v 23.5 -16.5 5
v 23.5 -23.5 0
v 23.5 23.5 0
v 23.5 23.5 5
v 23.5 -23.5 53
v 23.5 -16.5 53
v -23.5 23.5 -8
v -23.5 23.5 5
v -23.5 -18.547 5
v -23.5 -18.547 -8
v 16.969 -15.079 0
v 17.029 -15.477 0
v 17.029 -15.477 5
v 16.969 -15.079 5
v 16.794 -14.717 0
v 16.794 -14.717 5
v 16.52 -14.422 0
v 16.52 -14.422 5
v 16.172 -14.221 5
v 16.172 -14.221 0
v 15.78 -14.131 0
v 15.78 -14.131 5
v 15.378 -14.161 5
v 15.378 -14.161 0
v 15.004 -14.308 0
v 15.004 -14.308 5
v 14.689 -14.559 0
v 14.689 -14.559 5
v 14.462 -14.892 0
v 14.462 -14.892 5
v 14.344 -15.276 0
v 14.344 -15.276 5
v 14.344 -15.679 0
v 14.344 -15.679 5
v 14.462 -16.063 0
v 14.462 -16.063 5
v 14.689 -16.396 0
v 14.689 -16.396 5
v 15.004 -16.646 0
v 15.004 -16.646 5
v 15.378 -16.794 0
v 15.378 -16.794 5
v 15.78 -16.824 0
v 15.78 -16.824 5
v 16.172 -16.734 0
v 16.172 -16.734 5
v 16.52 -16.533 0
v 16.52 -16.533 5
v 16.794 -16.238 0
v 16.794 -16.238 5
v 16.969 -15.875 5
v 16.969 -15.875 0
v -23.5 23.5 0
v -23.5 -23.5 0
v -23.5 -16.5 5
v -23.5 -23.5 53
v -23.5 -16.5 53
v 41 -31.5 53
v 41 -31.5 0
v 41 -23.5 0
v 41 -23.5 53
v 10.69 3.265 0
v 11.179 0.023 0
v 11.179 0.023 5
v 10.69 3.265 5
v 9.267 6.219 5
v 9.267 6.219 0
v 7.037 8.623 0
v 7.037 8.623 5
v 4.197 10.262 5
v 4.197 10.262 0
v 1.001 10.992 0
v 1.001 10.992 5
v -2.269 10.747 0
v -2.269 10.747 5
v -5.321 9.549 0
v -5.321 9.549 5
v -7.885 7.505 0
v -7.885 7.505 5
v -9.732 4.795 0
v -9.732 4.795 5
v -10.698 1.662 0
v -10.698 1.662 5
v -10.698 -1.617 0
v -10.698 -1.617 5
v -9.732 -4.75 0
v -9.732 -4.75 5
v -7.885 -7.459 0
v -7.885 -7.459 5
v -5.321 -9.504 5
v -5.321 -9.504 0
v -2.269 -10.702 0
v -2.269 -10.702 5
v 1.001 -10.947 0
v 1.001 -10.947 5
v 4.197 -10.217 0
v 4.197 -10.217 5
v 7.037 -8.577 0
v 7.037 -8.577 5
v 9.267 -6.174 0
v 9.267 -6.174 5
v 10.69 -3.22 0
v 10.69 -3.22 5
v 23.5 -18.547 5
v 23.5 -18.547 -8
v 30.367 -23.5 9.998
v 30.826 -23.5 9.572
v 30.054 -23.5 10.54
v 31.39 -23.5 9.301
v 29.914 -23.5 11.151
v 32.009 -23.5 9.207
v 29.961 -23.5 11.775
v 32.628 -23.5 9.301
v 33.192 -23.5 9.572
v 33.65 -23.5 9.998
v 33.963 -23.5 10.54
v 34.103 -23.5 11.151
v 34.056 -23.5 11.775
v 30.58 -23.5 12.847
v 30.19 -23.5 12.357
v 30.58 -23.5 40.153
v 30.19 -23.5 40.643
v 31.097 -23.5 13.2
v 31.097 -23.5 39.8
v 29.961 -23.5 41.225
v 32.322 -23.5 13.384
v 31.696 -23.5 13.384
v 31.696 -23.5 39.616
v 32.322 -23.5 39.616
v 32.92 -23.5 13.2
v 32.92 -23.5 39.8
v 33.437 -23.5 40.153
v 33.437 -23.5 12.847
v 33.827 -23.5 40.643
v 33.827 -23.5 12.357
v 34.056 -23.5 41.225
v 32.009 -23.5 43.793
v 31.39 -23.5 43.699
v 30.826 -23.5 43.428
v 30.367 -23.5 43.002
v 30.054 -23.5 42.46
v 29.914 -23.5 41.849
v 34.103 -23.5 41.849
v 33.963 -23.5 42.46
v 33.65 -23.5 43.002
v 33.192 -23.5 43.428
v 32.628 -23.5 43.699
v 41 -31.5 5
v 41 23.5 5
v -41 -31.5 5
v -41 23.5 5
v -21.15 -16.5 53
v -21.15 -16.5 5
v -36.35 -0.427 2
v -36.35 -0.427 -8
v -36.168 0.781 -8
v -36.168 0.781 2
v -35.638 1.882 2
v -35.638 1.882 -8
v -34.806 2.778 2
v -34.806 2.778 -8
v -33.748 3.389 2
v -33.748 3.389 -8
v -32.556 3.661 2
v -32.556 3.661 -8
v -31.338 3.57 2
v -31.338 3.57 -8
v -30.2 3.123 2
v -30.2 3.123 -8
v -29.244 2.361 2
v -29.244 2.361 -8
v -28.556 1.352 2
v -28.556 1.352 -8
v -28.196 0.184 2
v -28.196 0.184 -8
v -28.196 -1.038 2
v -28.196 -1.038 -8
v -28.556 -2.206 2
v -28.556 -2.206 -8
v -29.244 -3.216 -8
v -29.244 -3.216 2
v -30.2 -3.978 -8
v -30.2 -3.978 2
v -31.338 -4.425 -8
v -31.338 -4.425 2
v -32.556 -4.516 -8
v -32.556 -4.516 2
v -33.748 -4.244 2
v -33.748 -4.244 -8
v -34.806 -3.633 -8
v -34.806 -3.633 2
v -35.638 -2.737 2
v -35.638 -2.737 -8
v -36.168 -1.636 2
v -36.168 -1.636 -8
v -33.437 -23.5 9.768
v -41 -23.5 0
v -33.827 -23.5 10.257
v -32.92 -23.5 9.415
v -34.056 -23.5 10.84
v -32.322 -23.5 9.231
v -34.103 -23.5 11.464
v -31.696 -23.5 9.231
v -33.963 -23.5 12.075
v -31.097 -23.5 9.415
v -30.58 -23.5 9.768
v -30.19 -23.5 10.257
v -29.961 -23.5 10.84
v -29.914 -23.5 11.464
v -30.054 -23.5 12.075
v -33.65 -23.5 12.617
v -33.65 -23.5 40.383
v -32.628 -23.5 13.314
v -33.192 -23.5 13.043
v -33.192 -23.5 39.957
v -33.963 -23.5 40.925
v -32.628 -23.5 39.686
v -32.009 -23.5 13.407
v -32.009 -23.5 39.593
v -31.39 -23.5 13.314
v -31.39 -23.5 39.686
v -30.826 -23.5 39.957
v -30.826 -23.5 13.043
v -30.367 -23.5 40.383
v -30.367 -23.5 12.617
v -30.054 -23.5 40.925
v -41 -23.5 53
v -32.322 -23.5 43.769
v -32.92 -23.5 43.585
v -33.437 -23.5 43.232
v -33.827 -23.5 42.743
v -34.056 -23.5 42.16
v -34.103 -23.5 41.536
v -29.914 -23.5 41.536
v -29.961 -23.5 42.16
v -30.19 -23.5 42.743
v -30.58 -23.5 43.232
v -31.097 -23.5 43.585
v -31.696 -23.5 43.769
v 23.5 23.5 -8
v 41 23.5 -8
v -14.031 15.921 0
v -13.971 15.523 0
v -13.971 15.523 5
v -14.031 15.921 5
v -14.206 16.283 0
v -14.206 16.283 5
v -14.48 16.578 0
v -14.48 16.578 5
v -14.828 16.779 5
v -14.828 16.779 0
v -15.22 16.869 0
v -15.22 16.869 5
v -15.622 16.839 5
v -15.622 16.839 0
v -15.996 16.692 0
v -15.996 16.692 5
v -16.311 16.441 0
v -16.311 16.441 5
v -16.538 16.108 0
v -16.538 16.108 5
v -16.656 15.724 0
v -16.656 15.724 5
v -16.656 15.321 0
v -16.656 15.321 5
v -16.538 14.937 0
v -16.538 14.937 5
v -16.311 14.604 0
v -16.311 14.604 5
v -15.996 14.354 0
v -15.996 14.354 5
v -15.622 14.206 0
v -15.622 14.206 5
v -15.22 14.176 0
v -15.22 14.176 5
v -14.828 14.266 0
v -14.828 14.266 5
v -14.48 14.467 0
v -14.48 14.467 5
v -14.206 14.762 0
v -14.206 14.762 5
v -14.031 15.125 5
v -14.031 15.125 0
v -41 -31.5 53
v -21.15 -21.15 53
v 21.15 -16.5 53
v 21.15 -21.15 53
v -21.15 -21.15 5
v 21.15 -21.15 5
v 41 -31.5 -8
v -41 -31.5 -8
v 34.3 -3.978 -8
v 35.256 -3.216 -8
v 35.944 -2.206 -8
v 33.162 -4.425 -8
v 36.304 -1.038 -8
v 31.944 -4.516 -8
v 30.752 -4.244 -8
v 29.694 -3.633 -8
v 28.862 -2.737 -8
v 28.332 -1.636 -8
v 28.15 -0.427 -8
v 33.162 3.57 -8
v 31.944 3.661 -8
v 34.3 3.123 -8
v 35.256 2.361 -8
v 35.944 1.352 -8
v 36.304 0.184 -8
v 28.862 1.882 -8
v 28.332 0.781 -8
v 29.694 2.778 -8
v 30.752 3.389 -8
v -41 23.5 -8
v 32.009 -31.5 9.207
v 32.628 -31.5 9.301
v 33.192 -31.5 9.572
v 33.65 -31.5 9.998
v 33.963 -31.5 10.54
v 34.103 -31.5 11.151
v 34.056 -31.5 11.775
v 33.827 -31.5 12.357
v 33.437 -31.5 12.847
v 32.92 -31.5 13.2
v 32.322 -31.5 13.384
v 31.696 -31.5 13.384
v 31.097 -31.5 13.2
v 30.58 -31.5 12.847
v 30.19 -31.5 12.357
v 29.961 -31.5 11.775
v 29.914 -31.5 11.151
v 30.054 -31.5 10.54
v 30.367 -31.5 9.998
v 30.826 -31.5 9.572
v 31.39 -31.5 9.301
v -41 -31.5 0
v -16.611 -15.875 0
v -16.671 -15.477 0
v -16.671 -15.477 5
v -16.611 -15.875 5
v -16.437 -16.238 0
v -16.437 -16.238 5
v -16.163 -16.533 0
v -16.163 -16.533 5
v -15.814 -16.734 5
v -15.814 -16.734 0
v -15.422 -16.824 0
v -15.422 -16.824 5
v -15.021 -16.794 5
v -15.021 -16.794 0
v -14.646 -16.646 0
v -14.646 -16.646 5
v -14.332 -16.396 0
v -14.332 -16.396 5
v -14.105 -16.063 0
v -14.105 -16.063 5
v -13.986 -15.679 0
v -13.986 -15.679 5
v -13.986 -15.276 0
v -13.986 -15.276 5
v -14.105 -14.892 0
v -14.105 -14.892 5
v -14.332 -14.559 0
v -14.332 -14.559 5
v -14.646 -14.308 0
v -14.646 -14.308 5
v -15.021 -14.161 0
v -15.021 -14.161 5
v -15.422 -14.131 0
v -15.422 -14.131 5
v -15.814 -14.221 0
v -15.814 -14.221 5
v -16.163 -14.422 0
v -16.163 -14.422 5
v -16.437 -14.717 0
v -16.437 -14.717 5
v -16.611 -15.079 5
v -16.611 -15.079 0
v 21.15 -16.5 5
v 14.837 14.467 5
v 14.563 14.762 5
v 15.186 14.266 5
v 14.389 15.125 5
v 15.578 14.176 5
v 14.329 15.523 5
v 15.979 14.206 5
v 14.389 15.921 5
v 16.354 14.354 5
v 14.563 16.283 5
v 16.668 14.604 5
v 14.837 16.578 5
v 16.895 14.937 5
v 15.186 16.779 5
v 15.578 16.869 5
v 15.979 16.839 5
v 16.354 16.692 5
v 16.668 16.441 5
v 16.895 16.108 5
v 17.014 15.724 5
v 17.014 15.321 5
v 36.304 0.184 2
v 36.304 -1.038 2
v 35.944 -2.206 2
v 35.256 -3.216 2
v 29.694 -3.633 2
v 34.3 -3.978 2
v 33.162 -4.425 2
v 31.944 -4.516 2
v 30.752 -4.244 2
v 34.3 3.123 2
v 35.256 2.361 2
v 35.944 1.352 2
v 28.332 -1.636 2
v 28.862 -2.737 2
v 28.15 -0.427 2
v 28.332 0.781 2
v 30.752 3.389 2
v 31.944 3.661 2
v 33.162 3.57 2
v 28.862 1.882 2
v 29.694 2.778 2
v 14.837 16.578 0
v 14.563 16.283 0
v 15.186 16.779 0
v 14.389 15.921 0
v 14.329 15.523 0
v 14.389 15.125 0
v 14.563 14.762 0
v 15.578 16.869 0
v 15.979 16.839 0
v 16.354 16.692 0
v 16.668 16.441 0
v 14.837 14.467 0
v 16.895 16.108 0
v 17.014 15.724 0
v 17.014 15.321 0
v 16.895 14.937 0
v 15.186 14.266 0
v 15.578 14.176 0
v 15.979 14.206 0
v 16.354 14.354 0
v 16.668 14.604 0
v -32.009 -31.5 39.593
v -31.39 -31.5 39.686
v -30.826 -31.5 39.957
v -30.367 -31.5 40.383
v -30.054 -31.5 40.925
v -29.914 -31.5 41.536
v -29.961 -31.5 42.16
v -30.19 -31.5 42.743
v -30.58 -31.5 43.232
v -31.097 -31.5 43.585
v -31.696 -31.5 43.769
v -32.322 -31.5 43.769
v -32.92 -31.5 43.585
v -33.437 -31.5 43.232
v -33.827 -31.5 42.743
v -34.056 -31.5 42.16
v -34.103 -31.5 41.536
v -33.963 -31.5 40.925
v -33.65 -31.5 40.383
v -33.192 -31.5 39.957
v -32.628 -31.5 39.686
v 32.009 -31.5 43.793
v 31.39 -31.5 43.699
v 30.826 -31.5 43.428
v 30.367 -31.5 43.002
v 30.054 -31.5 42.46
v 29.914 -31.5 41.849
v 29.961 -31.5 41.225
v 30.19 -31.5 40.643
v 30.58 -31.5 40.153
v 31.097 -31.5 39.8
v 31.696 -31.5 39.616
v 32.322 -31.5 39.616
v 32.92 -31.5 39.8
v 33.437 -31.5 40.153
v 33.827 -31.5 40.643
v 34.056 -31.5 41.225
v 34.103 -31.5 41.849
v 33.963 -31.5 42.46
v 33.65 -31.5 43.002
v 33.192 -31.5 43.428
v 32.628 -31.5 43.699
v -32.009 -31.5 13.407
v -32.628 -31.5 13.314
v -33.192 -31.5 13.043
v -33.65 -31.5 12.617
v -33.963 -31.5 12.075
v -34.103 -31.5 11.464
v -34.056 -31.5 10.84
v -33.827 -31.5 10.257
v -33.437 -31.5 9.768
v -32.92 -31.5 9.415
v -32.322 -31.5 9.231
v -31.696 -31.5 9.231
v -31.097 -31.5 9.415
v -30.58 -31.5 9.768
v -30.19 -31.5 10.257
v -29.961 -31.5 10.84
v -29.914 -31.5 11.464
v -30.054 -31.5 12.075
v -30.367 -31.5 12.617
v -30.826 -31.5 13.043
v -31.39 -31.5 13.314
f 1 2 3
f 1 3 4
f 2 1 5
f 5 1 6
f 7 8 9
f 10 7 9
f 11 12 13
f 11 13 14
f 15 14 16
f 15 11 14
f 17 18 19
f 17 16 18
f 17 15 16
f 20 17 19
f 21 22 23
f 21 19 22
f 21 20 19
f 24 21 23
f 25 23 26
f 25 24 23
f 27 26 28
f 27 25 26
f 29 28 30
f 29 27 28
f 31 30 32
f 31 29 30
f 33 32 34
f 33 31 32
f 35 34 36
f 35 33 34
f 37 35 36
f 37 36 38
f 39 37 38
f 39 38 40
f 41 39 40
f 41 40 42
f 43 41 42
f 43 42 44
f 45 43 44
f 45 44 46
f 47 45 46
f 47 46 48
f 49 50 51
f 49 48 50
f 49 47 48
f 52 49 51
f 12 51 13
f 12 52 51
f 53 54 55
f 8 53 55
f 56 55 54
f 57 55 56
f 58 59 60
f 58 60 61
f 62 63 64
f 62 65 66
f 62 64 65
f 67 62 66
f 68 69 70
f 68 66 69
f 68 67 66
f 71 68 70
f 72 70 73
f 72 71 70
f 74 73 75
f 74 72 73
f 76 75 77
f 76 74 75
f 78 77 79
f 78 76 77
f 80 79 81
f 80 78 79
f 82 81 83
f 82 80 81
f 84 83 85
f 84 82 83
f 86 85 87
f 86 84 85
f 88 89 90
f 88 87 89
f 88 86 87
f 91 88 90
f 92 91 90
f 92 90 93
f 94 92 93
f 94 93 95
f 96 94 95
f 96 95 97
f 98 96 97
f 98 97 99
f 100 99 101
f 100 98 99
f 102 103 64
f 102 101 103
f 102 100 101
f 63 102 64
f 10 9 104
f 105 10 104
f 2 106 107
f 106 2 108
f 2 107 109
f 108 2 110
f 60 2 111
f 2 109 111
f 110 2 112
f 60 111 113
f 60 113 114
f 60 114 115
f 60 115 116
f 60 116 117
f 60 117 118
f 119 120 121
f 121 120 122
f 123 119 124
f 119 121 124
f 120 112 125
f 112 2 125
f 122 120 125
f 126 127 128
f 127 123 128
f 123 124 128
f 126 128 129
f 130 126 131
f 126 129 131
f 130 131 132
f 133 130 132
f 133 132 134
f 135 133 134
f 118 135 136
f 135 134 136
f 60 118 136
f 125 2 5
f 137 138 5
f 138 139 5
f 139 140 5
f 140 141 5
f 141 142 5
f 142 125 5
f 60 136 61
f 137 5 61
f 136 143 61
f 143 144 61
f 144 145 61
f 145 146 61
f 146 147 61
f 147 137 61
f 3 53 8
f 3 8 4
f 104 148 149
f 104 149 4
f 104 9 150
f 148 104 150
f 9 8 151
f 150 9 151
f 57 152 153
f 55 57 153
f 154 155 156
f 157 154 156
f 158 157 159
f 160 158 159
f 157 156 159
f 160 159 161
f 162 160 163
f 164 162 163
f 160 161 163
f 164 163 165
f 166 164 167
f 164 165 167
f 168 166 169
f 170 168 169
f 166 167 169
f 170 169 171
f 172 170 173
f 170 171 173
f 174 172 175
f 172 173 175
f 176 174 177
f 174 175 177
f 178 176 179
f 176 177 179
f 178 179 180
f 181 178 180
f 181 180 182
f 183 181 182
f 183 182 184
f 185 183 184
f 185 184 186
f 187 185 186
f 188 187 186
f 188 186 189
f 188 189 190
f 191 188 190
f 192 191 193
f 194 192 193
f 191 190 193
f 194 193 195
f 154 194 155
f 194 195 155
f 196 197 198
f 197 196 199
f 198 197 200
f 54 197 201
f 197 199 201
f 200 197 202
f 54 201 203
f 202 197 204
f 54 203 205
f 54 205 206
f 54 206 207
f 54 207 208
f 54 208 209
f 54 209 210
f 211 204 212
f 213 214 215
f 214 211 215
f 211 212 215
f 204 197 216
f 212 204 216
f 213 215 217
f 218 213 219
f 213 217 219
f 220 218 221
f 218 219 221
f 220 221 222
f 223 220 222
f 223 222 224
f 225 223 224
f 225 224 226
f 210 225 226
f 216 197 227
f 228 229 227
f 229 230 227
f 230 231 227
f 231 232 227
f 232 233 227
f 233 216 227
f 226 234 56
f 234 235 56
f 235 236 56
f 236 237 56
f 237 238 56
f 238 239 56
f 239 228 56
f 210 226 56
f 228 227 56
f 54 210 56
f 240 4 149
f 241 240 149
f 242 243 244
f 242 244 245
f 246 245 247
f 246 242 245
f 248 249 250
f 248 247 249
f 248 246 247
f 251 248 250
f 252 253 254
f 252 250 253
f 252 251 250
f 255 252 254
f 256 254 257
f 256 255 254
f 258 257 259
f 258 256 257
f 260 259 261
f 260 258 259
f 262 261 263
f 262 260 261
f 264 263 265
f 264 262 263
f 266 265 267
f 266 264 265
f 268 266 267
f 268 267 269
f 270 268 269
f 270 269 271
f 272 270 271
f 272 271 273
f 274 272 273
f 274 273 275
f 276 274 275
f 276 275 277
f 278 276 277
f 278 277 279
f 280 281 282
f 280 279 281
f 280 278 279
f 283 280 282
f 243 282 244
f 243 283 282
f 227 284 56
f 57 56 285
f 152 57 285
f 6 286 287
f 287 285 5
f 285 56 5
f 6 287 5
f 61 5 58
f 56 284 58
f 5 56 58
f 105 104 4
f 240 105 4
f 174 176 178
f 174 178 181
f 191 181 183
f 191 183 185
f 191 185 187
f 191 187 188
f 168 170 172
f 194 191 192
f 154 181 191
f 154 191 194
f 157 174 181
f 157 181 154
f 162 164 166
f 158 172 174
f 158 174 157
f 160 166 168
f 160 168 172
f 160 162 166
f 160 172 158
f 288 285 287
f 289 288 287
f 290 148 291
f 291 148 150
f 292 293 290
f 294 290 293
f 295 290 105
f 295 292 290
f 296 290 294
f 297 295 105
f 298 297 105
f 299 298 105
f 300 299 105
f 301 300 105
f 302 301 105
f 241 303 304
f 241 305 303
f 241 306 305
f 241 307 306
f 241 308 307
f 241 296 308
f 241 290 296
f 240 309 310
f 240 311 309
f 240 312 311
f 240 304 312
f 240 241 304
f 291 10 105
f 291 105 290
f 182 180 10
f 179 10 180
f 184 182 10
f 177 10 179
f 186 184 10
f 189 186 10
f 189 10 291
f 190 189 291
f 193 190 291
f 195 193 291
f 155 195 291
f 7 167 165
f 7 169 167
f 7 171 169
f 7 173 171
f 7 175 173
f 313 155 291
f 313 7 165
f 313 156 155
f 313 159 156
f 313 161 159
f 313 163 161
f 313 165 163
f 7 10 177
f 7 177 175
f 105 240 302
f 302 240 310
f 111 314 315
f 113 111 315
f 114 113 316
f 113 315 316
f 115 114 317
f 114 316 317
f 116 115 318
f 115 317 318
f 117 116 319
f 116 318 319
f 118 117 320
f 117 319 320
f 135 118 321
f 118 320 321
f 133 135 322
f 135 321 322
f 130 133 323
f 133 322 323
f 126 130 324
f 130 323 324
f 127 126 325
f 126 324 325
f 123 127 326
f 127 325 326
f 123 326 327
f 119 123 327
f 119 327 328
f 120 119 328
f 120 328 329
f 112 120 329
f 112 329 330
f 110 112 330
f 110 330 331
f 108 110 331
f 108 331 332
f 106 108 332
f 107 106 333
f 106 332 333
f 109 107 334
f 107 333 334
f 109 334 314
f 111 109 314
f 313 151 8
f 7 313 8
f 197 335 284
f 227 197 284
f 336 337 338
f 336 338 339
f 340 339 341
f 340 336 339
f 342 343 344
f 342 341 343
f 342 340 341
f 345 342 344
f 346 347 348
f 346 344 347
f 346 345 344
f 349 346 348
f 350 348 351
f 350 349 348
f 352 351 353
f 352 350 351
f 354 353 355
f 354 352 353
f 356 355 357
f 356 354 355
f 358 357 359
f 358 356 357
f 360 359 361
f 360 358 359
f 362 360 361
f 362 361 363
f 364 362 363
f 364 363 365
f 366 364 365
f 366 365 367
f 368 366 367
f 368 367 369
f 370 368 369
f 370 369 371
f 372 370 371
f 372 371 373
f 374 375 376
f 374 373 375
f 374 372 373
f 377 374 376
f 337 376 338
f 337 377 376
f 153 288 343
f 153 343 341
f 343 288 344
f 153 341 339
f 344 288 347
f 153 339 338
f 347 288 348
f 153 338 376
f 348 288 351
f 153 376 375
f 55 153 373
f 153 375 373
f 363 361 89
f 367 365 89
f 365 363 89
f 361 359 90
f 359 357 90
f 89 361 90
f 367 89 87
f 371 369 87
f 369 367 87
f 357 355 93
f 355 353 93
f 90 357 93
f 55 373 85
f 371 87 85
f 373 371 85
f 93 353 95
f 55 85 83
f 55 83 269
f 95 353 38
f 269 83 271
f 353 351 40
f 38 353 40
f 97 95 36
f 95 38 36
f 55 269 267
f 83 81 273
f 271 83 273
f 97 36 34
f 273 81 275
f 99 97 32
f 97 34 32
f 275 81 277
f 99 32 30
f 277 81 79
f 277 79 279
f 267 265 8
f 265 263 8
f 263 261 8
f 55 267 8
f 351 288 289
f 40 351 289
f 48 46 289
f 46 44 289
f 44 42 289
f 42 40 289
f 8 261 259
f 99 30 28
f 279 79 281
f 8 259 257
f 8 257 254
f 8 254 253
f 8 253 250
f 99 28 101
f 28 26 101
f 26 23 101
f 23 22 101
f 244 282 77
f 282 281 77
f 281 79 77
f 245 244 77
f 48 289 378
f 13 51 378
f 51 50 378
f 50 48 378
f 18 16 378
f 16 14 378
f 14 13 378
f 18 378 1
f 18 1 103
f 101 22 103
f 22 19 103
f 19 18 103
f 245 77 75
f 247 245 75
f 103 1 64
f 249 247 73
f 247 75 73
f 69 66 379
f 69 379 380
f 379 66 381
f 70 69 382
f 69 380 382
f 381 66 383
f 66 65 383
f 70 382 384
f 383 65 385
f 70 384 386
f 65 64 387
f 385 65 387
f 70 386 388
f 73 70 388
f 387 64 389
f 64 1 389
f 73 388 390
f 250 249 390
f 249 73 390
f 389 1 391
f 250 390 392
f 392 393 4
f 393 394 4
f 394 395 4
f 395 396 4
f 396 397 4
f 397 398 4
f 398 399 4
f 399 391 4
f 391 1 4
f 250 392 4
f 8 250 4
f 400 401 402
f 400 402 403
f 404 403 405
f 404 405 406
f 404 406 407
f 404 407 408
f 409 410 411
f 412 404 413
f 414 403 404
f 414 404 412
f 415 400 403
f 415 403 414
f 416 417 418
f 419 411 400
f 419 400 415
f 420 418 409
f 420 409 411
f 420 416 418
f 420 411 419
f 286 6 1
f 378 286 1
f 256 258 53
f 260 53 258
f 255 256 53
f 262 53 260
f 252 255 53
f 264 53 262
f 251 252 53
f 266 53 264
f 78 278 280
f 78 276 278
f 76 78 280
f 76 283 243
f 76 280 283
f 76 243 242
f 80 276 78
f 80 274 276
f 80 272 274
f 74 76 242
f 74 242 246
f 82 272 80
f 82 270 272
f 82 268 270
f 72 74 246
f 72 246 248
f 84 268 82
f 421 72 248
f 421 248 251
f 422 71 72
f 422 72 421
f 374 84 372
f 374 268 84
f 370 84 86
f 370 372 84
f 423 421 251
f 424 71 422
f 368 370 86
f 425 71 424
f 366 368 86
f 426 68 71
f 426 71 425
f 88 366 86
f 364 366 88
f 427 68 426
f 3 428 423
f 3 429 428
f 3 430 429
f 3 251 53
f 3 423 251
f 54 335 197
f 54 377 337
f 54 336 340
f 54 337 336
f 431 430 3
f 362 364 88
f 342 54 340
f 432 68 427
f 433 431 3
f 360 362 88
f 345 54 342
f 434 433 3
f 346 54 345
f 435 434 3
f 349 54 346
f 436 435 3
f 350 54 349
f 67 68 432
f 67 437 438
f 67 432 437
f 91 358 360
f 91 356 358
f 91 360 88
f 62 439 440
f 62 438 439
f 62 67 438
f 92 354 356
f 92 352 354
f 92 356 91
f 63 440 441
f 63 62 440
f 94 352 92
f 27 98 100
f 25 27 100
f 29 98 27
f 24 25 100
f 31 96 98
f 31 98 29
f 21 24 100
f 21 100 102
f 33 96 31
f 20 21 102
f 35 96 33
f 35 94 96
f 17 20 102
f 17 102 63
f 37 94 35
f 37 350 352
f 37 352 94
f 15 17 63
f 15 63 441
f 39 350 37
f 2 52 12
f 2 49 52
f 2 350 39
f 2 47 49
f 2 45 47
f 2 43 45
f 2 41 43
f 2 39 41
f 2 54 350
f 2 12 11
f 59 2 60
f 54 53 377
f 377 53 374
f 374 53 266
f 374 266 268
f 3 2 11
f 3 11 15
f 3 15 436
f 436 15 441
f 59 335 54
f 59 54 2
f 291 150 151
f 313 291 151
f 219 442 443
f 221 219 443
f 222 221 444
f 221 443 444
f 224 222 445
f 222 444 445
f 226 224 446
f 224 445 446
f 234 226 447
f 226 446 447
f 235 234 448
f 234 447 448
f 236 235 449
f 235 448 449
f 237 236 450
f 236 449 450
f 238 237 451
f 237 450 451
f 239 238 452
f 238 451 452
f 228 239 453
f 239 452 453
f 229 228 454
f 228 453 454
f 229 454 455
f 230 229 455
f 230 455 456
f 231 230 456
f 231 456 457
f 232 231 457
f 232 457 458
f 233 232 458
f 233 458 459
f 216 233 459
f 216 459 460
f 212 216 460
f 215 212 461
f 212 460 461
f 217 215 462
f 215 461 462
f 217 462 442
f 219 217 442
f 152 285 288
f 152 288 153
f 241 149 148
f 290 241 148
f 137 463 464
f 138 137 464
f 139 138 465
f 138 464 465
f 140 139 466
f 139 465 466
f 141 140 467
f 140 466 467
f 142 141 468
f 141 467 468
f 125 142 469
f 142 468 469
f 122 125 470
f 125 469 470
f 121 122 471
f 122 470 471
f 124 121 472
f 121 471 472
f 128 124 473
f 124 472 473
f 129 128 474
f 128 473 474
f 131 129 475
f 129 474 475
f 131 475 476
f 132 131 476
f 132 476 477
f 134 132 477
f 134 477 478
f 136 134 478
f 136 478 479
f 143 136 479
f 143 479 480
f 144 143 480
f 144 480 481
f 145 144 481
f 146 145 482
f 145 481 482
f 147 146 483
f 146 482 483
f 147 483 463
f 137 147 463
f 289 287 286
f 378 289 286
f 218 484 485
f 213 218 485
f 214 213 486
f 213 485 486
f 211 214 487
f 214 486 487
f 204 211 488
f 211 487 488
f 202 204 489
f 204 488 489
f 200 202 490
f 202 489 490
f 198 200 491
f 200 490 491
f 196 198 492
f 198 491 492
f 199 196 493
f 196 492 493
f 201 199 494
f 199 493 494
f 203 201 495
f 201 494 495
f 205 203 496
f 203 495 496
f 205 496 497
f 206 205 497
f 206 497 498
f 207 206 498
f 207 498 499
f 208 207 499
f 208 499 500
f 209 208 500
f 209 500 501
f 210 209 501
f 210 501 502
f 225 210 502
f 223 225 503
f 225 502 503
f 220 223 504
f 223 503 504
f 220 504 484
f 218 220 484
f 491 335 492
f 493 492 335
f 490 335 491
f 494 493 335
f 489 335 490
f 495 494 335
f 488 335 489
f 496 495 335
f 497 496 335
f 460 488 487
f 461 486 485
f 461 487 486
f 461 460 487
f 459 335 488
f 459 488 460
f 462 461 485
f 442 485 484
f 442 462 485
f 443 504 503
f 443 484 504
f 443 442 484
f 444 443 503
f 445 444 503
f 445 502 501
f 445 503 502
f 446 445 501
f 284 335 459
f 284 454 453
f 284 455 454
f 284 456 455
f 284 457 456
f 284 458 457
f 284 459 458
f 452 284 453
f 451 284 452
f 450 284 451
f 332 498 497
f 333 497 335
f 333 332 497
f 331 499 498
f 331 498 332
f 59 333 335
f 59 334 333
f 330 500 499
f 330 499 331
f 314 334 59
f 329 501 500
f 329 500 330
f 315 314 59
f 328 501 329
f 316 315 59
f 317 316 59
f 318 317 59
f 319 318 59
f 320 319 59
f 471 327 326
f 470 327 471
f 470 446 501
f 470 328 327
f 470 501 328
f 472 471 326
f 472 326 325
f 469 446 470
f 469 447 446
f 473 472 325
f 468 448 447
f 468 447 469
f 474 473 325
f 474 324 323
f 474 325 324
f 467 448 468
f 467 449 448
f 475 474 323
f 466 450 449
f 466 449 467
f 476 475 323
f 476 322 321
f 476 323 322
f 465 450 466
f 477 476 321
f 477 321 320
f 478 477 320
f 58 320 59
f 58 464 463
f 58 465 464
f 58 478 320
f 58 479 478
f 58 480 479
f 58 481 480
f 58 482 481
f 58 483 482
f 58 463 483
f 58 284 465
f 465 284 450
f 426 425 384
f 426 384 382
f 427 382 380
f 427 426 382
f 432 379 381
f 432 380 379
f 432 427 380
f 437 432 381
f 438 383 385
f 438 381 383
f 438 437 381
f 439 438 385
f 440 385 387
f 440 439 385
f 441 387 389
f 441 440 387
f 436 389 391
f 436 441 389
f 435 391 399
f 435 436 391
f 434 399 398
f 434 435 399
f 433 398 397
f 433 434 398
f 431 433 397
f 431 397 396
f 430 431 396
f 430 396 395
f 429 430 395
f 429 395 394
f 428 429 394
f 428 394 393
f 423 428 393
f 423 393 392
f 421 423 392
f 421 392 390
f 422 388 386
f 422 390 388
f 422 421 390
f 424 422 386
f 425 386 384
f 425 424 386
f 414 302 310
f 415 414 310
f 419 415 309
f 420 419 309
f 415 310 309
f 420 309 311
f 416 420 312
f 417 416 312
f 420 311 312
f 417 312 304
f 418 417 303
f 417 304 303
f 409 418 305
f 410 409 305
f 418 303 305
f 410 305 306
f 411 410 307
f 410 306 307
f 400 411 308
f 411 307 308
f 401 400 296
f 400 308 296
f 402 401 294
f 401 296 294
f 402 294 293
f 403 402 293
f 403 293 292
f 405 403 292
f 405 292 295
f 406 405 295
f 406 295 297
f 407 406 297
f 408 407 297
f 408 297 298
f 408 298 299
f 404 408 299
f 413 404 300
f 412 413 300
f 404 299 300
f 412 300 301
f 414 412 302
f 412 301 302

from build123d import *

# Parameters (mm, degrees)
SKETCH_1_W               = 47
SKETCH_1_H               = 47
EXTRUDE_1_DEPTH          = 53
SKETCH_2_W               = 42.3
SKETCH_2_H               = 42.3
CUT_EXTRUDE_1_DEPTH      = 48
CUT_EXTRUDE_2_DEPTH      = 59.38236035
CUT_EXTRUDE_2_DEPTH_BACK = 59.38236035
SKETCH_3_R               = 11
SKETCH_3_R_2             = 1.35
SKETCH_7_W               = 48
SKETCH_7_H               = 40
CUT_EXTRUDE_5_DEPTH      = 47.5
SKETCH_16_W              = 47
SKETCH_16_H              = 53
EXTRUDE_4_DEPTH          = 8
SKETCH_17_W              = 82
SKETCH_17_H              = 53
SKETCH_17_R              = 2.1
EXTRUDE_5_DEPTH          = 8
EXTRUDE_17_DEPTH         = 8
EXTRUDE_17_DEPTH_BACK    = 5
SKETCH_24_R              = 4.1
CUT_EXTRUDE_6_DEPTH      = 10


with BuildPart() as part:
    # Эскиз1 → Бобышка-Вытянуть1 (new body)
    with BuildSketch(Plane.XY):
        Rectangle(SKETCH_1_W, SKETCH_1_H)
    extrude(amount=EXTRUDE_1_DEPTH)

    # Эскиз2 → Вырез-Вытянуть1 (cut)
    with BuildSketch(Plane.XY.offset(53)):
        Rectangle(SKETCH_2_W, SKETCH_2_H)
    extrude(amount=-CUT_EXTRUDE_1_DEPTH, mode=Mode.SUBTRACT)

    # Эскиз3 → Вырез-Вытянуть2 (cut, two sides: drawn at the far end of the back side and taken through both)
    with BuildSketch(Plane.XY.offset(5).offset(-CUT_EXTRUDE_2_DEPTH_BACK)):
        with Locations((0.178742266, 0.022649375)):
            Circle(SKETCH_3_R)
        with Locations((-15.321257734, 15.522649375)):
            Circle(SKETCH_3_R_2)
        with Locations(Location((15.678742266, 15.522649375, 0), (0, 0, 180))):
            Circle(SKETCH_3_R_2)
        with Locations((15.678742266, -15.477350625)):
            Circle(SKETCH_3_R_2)
        with Locations(Location((-15.321257734, -15.477350625, 0), (0, 0, 180))):
            Circle(SKETCH_3_R_2)
    extrude(amount=CUT_EXTRUDE_2_DEPTH + CUT_EXTRUDE_2_DEPTH_BACK, mode=Mode.SUBTRACT)

    # Эскиз7 → Вырез-Вытянуть5 (cut)
    with BuildSketch(Plane(origin=(23.5, 0, 0), x_dir=(0, 0, -1), z_dir=(1, 0, 0))):
        with Locations((-29, 3.5)):
            Rectangle(SKETCH_7_W, SKETCH_7_H)
    extrude(amount=-CUT_EXTRUDE_5_DEPTH, mode=Mode.SUBTRACT)

    # Эскиз16 → Бобышка-Вытянуть4 (add)
    with BuildSketch(Plane.XZ.offset(23.5)):
        with Locations((0, 26.5)):
            Rectangle(SKETCH_16_W, SKETCH_16_H)
    extrude(amount=EXTRUDE_4_DEPTH)

    # Эскиз17 → Бобышка-Вытянуть5 (add)
    with BuildSketch(Plane.XZ.offset(31.5)):
        with Locations((0, 26.5)):
            Rectangle(SKETCH_17_W, SKETCH_17_H)
        with Locations(Location((-32.008542265, 41.692513381, 0), (0, 0, 270))):
            Circle(SKETCH_17_R, mode=Mode.SUBTRACT)
        with Locations(Location((-32.008542265, 11.307486619, 0), (0, 0, 90))):
            Circle(SKETCH_17_R, mode=Mode.SUBTRACT)
        with Locations(Location((32.008542265, 11.307486619, 0), (0, 0, 270))):
            Circle(SKETCH_17_R, mode=Mode.SUBTRACT)
        with Locations(Location((32.008542265, 41.692513381, 0), (0, 0, 90))):
            Circle(SKETCH_17_R, mode=Mode.SUBTRACT)
    extrude(amount=-EXTRUDE_5_DEPTH)


with BuildPart() as body_2:
    # Эскиз22 → Бобышка-Вытянуть17 (new, two sides: drawn at the far end of the back side and taken through both)
    with BuildSketch(Plane(origin=(0, 0, 0), x_dir=(-1, 0, 0), z_dir=(0, 0, -1)).offset(-EXTRUDE_17_DEPTH_BACK)):
        Polygon((-23.5, 23.5), (-41, 23.5), (-41, -31.5), (41, -31.5), (41, 23.5), (23.5, 23.5), (23.5, -18.547479391), (-23.5, -18.547479391), align=None)
    extrude(amount=EXTRUDE_17_DEPTH + EXTRUDE_17_DEPTH_BACK)

    # Эскиз24 → Вырез-Вытянуть6 (cut)
    with BuildSketch(Plane(origin=(0, 0, -8), x_dir=(-1, 0, 0), z_dir=(0, 0, -1))):
        with Locations((-32.25, -0.427350625)):
            Circle(SKETCH_24_R)
        with Locations((32.25, -0.427350625)):
            Circle(SKETCH_24_R)
    extrude(amount=-CUT_EXTRUDE_6_DEPTH, mode=Mode.SUBTRACT)


solid = Compound([part.part, body_2.part])
